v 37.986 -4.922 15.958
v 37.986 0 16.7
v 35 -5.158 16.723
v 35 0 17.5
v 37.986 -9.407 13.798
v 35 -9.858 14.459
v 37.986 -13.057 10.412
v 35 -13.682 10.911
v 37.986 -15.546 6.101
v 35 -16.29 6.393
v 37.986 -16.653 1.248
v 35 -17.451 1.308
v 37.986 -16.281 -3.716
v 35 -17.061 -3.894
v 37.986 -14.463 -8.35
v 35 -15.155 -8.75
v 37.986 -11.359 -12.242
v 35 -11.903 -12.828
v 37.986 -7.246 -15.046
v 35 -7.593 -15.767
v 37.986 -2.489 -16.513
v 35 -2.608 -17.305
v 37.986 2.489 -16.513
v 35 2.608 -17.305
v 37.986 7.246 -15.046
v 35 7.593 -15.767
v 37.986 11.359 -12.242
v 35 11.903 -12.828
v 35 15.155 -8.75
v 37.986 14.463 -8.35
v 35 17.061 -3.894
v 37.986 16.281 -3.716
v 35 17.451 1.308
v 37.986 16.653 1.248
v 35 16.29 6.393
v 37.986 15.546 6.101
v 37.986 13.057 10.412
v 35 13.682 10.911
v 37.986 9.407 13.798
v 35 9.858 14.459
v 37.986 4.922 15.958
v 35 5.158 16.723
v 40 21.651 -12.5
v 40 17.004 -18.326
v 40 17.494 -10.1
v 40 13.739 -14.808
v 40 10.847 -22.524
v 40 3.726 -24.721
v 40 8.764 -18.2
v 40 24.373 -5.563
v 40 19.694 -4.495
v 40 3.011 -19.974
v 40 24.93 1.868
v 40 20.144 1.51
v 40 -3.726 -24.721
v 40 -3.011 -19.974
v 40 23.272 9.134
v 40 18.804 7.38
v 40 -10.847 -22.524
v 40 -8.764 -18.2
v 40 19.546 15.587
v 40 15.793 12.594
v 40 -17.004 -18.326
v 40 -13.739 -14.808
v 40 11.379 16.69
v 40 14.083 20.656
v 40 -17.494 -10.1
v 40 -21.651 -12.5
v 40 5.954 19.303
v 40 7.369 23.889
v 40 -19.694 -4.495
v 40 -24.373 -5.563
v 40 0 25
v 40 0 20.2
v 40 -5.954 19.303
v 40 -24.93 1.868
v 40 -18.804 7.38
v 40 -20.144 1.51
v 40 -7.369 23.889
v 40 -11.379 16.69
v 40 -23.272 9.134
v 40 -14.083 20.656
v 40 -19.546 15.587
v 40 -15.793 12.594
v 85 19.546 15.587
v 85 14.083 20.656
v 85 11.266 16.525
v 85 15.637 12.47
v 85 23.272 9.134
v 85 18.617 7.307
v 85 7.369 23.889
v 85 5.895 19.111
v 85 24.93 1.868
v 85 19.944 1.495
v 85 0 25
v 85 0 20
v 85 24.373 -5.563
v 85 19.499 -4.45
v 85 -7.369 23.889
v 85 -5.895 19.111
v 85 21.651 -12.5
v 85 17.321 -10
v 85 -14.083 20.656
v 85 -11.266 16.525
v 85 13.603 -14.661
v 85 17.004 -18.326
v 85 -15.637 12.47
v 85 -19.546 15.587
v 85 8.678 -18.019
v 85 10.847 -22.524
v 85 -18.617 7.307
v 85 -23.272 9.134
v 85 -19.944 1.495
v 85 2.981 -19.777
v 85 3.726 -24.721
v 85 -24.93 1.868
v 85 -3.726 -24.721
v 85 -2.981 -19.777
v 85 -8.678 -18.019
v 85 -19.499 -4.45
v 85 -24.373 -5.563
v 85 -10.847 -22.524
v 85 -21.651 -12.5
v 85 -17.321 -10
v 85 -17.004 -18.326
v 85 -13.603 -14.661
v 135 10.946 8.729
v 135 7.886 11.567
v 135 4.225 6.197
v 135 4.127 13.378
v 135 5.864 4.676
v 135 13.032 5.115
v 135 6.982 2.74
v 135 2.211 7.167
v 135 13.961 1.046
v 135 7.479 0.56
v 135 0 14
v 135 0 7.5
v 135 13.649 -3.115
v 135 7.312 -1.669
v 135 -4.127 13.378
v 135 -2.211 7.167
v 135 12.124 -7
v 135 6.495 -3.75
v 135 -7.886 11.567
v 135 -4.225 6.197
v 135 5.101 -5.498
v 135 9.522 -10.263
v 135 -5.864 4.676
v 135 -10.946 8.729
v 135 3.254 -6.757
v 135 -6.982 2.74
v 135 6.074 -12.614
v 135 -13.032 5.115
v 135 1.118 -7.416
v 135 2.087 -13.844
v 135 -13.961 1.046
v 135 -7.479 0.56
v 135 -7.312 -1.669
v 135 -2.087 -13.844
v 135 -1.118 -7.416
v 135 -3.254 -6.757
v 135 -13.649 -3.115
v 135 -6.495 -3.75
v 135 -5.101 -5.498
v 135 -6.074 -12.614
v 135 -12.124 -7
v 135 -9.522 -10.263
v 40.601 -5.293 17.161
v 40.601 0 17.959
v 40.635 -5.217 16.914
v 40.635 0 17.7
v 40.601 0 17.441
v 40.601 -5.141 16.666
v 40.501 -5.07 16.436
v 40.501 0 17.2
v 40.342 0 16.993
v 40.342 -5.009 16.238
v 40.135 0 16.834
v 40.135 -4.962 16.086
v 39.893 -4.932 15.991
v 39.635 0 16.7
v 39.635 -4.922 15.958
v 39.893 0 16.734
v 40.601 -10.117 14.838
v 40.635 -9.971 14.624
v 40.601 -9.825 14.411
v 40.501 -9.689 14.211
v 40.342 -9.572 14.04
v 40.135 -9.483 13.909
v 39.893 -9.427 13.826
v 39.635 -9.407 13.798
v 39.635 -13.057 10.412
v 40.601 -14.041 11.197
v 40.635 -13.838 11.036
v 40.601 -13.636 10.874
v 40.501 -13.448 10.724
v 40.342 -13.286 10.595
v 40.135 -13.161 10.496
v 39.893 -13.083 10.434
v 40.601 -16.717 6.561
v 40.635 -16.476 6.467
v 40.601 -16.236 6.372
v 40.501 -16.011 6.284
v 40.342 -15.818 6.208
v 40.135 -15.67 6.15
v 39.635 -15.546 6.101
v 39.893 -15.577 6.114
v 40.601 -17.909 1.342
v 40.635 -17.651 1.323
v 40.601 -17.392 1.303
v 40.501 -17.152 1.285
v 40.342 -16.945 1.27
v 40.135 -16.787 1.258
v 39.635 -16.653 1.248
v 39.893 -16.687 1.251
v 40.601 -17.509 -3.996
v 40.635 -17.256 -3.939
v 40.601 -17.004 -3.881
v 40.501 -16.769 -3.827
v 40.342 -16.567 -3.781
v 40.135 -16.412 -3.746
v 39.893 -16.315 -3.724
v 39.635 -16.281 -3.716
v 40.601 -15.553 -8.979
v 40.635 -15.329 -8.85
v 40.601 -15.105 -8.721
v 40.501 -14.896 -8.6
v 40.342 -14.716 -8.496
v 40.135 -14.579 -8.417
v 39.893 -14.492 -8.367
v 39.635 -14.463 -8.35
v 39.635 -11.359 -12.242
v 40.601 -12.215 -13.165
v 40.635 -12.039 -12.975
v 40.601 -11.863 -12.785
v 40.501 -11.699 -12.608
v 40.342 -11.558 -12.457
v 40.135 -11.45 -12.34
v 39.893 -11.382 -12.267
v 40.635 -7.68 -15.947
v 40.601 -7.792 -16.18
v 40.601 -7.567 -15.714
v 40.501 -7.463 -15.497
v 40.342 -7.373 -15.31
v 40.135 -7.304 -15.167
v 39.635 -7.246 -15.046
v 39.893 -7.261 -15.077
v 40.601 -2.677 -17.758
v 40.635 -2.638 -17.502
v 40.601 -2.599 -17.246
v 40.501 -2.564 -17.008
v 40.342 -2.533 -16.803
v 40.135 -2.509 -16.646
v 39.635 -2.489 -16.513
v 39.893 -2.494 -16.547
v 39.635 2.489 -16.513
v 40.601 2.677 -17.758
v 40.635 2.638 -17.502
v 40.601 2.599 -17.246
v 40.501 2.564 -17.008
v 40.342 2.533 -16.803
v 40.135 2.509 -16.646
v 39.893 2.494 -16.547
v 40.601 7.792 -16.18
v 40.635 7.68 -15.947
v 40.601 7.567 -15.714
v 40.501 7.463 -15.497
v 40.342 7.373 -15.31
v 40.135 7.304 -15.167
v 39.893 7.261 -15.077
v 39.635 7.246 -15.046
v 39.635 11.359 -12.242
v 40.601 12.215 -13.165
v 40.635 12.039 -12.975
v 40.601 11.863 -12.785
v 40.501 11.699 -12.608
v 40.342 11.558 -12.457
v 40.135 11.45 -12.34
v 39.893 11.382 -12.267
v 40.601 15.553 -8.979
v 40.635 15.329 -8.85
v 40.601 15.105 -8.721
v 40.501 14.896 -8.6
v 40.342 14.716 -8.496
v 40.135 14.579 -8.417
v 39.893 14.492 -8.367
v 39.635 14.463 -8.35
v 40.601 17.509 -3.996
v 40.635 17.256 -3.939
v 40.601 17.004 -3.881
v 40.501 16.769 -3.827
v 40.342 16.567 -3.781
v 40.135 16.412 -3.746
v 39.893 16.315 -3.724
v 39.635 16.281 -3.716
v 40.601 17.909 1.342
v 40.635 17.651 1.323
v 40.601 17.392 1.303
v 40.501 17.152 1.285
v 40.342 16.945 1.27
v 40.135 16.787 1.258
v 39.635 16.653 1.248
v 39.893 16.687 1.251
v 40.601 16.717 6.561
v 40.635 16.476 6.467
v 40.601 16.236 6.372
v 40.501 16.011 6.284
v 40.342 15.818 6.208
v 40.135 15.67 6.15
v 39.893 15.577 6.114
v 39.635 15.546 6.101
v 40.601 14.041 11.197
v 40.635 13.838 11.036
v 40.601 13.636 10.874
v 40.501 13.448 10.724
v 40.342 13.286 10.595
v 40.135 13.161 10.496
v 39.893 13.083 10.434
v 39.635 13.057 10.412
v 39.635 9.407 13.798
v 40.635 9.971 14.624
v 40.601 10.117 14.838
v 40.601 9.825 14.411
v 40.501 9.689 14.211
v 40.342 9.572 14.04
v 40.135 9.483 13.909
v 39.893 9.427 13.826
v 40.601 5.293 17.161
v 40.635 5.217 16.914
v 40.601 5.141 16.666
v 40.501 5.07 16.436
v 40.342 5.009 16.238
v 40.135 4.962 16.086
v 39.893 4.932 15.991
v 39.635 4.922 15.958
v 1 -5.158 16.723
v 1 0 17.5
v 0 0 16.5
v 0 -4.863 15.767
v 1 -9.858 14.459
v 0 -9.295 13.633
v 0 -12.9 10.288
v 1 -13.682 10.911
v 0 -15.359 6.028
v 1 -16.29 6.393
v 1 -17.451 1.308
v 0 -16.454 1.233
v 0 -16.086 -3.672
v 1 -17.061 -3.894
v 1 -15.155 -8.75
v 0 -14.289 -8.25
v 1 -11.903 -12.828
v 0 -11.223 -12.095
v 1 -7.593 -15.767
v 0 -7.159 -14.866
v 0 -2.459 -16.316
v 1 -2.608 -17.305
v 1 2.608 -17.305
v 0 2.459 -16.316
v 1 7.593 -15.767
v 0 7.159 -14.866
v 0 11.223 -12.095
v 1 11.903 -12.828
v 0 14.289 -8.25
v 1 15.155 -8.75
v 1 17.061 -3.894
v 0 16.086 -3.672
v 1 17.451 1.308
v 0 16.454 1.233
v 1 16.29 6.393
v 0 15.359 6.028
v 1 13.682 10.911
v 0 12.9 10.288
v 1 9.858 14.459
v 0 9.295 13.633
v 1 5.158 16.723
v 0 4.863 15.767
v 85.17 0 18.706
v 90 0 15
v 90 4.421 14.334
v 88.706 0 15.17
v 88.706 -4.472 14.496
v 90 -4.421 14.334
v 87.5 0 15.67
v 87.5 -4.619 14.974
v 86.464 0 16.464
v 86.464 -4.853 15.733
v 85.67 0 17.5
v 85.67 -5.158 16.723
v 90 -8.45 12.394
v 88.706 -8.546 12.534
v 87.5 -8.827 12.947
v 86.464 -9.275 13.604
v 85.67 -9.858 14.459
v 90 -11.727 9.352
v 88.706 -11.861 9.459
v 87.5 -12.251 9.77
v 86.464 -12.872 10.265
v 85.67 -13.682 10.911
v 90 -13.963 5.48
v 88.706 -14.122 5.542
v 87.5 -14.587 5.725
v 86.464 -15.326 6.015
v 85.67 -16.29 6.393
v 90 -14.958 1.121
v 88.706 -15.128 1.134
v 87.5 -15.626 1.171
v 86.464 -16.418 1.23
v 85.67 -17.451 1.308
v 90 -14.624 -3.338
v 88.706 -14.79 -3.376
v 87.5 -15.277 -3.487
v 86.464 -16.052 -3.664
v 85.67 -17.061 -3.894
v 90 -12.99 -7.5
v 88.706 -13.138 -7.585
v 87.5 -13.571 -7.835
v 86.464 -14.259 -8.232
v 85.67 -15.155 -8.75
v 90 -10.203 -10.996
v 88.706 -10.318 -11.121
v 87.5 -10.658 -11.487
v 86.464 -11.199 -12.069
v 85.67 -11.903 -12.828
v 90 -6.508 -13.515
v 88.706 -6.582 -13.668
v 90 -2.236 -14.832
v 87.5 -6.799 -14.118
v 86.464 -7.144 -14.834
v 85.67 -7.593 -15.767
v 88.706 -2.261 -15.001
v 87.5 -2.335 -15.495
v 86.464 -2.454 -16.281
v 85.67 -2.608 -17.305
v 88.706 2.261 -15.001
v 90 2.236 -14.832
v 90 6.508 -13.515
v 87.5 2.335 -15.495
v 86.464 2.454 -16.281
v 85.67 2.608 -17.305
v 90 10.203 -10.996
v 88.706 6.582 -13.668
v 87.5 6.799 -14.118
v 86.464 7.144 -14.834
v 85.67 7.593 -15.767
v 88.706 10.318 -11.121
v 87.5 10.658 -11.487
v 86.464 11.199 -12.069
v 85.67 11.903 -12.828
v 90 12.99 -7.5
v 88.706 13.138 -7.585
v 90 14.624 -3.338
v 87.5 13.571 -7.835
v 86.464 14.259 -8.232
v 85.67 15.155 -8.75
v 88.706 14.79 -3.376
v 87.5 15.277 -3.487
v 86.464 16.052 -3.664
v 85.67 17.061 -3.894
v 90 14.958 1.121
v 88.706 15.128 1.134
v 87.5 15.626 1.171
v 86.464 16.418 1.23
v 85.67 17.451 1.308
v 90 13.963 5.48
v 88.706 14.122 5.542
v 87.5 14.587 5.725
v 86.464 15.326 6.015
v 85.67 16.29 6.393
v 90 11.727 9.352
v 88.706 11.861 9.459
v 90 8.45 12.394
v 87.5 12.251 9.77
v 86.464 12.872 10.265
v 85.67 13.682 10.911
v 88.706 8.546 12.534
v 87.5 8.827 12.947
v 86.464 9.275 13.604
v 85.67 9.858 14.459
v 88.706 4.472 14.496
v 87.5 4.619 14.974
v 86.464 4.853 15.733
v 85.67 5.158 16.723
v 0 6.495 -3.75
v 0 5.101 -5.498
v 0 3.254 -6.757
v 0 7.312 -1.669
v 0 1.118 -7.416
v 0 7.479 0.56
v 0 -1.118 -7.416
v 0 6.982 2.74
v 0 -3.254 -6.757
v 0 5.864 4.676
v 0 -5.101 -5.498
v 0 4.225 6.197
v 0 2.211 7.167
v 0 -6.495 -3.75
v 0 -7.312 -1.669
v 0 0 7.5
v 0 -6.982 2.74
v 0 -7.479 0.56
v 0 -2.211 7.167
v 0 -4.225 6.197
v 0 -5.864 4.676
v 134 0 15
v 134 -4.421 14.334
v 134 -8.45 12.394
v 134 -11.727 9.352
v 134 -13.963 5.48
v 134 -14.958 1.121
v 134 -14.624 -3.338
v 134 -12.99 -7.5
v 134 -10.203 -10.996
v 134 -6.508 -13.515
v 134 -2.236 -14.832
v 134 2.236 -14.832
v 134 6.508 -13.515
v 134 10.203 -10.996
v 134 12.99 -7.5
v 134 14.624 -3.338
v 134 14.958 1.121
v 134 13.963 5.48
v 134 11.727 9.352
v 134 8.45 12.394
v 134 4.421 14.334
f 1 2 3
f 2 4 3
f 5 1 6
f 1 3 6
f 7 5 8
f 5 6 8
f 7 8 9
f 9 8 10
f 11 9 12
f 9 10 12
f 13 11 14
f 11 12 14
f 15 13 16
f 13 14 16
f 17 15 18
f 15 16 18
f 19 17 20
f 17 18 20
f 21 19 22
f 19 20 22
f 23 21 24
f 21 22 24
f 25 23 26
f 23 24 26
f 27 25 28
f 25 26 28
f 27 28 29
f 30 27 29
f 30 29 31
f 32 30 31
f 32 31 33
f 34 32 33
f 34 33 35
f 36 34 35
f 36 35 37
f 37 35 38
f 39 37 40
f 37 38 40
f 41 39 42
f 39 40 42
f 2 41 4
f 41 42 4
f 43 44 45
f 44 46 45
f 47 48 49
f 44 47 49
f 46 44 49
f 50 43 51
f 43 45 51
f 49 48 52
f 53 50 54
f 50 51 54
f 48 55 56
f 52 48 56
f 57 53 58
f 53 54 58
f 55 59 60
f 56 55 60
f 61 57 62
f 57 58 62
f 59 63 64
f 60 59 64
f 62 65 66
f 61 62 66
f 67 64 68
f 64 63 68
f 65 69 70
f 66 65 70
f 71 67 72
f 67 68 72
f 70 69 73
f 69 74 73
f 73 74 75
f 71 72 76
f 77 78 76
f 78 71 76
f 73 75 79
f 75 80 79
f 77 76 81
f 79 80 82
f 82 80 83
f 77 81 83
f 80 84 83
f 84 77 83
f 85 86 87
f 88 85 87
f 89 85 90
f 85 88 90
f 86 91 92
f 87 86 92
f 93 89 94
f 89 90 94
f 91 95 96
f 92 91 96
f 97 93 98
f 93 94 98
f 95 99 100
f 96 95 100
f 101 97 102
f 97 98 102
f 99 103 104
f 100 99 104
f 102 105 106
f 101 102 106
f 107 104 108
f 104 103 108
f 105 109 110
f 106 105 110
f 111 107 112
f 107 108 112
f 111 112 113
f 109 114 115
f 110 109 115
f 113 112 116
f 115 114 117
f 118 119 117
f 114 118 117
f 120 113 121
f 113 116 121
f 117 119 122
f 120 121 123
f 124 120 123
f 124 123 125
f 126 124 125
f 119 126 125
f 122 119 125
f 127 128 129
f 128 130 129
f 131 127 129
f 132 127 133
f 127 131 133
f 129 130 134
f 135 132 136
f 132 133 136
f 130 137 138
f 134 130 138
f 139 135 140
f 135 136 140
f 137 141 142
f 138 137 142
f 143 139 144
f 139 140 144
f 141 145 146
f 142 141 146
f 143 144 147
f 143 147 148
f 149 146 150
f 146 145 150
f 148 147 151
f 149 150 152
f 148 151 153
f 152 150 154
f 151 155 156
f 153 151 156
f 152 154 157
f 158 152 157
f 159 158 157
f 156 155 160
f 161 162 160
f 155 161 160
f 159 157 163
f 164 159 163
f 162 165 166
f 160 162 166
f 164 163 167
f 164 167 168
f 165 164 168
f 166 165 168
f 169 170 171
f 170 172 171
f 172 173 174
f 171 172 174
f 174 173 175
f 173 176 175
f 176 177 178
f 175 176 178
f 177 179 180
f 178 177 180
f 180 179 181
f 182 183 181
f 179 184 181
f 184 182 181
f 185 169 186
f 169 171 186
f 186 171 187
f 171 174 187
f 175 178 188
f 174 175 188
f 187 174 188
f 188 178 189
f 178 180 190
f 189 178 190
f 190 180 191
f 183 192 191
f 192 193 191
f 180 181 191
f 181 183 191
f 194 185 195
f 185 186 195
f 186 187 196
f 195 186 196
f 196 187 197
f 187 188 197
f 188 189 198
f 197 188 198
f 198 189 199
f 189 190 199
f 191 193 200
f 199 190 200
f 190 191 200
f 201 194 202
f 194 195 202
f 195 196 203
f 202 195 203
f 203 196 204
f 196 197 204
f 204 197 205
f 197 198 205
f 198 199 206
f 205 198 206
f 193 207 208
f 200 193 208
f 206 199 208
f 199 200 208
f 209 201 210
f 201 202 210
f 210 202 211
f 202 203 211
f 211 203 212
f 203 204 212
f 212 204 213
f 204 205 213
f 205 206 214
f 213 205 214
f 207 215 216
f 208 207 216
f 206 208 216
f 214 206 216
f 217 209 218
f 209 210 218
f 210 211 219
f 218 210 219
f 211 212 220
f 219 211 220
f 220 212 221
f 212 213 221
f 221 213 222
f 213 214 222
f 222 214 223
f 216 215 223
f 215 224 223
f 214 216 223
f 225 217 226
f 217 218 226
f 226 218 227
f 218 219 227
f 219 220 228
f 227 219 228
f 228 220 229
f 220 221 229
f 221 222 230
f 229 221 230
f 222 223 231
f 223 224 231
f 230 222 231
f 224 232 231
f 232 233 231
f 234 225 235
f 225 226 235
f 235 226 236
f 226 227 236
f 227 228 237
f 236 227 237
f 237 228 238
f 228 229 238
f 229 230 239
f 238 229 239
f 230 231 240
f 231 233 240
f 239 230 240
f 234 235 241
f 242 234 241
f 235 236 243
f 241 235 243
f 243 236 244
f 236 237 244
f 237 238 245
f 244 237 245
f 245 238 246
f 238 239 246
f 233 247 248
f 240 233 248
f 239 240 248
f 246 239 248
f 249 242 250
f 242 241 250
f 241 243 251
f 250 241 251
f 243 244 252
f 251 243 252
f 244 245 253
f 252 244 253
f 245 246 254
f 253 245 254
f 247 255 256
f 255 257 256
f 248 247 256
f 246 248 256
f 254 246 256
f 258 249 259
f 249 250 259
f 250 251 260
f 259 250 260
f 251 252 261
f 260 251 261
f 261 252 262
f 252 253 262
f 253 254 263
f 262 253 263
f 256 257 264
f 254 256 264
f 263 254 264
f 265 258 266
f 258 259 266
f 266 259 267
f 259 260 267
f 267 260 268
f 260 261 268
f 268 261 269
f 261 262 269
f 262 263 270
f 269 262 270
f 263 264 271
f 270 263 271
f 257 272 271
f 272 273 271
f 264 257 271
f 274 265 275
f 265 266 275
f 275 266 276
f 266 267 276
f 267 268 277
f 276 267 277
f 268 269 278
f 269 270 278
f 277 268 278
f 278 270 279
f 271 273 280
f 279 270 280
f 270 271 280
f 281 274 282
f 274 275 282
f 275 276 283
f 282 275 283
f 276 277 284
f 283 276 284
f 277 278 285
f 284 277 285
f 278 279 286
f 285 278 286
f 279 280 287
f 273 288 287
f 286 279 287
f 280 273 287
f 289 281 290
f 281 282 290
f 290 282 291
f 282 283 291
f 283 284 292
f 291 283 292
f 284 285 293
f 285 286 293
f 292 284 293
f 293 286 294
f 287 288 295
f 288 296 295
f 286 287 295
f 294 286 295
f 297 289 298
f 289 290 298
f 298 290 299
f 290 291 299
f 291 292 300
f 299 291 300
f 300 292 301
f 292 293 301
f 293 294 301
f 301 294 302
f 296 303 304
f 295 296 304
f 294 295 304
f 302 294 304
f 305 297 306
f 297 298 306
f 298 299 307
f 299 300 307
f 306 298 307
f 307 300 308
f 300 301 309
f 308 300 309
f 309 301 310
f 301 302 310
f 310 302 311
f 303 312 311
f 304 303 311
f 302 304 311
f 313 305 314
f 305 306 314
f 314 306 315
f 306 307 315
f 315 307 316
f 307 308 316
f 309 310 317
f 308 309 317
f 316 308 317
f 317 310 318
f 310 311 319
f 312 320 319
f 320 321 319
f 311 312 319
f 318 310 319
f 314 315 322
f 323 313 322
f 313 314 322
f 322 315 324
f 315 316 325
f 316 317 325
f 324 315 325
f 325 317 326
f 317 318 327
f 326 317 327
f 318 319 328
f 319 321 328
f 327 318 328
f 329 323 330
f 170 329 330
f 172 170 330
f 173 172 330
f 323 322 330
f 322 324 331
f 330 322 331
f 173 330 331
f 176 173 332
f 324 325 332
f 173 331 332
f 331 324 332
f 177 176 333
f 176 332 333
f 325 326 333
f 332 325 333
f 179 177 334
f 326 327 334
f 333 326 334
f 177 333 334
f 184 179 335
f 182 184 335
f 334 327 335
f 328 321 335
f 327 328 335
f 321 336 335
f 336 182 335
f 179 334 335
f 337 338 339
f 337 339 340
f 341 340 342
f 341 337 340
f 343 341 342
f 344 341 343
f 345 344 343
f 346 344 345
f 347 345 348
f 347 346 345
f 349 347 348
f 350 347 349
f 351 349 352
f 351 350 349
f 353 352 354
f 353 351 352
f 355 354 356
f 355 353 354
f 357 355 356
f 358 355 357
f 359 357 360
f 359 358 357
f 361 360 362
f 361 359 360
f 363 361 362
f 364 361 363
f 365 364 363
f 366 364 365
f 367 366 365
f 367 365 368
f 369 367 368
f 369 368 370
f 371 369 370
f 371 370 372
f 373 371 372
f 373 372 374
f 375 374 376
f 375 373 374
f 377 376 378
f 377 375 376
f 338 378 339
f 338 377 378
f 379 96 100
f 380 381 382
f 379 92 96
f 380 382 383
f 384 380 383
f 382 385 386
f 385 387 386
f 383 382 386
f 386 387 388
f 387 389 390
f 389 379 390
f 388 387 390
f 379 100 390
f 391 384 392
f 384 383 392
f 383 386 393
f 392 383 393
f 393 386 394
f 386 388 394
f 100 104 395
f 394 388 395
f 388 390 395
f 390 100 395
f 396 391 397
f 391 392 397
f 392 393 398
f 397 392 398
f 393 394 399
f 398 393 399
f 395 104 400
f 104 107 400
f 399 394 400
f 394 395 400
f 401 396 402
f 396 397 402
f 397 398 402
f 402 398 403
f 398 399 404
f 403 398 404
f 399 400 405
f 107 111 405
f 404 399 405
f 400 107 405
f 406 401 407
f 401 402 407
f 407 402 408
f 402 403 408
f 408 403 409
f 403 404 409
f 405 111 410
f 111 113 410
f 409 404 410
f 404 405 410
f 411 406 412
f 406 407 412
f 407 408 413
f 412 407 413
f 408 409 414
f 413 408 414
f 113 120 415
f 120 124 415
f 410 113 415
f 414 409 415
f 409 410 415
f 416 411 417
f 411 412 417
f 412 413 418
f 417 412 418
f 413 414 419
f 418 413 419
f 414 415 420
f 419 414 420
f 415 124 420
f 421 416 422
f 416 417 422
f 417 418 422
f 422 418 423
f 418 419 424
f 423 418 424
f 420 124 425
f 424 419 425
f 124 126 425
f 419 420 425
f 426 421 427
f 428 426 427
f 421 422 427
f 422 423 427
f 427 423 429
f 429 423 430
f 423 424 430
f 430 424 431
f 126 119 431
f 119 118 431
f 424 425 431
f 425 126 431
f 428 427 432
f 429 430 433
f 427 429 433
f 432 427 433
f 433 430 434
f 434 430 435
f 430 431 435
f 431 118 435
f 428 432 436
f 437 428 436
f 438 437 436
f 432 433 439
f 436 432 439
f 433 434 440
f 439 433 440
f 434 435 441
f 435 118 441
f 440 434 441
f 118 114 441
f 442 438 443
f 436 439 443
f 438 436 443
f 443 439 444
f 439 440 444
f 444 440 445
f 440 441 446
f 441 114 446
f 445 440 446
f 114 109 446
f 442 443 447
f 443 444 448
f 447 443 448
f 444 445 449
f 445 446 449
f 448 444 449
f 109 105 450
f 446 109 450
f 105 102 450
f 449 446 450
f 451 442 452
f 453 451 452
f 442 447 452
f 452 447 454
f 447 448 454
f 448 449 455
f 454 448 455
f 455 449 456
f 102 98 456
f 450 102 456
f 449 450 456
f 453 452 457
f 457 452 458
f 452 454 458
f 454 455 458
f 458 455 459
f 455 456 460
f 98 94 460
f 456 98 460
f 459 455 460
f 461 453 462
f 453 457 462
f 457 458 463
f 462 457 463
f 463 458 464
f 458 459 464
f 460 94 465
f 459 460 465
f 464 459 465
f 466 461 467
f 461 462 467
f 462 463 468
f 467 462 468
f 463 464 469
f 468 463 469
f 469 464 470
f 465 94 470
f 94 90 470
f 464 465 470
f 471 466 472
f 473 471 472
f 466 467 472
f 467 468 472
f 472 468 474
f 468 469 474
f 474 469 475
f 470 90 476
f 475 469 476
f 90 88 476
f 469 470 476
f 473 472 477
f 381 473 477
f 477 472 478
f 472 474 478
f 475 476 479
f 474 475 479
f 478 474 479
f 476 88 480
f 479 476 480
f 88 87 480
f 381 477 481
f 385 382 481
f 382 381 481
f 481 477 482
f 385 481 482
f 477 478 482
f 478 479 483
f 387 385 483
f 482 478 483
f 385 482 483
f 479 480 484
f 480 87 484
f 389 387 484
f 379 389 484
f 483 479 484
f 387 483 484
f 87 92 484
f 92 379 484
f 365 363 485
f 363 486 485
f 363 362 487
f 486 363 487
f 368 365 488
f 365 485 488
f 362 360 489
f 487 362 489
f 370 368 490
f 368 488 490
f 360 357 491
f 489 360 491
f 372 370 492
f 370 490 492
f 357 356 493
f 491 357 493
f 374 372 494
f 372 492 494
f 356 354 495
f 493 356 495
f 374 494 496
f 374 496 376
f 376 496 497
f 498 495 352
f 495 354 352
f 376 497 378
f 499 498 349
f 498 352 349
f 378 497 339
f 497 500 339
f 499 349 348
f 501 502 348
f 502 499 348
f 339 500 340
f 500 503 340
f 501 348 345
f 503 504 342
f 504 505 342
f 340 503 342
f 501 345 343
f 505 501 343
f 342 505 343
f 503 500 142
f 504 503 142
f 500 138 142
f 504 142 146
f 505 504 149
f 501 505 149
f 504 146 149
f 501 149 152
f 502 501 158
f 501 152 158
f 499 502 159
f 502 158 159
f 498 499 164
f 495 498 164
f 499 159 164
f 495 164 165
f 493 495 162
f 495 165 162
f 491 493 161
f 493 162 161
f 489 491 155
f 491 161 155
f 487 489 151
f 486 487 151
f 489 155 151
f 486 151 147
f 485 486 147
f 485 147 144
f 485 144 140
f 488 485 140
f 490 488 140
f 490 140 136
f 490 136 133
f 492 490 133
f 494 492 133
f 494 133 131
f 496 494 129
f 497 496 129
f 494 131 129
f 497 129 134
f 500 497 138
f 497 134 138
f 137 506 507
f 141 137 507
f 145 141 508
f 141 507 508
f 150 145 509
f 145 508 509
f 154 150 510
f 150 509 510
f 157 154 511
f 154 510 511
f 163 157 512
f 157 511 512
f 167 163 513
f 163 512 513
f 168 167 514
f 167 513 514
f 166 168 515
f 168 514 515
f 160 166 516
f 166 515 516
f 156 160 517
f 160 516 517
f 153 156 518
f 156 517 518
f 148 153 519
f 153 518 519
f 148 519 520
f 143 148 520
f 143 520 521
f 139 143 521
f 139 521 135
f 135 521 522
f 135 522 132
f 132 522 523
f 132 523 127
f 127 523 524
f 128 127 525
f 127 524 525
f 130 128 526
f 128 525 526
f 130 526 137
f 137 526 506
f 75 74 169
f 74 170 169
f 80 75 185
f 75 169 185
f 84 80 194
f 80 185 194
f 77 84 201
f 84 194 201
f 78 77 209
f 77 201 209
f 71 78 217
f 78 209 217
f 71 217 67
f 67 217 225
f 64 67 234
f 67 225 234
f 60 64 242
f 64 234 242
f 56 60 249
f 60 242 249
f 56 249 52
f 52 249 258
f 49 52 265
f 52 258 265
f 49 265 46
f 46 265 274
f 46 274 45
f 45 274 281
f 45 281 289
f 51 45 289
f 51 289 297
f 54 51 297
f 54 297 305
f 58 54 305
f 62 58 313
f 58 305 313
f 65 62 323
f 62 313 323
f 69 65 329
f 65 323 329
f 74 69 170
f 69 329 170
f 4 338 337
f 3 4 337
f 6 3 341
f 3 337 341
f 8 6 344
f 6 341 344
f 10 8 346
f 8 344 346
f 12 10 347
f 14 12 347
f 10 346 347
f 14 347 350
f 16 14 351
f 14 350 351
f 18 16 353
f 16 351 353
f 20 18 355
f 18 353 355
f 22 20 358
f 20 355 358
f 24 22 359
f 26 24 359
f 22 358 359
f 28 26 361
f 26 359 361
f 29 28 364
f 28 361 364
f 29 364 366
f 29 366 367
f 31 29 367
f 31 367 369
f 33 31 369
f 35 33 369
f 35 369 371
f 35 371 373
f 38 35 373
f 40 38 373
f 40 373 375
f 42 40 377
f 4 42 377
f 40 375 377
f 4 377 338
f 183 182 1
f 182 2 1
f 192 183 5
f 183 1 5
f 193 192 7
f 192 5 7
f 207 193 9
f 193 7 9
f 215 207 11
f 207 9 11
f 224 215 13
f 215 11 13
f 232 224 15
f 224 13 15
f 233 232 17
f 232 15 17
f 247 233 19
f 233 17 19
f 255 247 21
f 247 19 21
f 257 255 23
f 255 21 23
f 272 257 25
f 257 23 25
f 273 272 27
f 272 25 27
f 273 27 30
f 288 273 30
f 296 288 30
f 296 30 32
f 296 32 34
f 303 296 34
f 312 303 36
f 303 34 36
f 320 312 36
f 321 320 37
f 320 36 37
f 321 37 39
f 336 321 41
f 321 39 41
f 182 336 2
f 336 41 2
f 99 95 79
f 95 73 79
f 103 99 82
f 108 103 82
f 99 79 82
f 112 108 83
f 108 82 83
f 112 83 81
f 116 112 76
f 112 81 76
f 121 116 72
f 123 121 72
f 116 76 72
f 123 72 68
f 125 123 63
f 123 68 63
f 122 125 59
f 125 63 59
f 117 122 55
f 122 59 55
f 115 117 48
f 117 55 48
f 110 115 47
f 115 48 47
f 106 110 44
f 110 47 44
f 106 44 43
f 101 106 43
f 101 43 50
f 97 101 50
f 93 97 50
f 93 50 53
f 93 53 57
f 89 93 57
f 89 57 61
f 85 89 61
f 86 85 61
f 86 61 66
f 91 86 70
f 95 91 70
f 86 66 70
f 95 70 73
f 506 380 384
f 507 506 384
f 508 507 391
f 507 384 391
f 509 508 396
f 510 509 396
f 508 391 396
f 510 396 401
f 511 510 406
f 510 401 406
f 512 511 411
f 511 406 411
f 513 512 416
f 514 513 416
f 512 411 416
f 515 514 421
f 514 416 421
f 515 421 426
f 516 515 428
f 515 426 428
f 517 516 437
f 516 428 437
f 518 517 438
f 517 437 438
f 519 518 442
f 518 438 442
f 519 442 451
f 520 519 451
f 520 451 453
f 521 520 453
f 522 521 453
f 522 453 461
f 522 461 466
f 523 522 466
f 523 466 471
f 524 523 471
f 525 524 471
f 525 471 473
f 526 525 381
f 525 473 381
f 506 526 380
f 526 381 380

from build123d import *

# Parameters (mm, degrees)
F2_SIZE = 1
F3_R    = 5


with BuildPart() as f1:
    # F0 (on Front) → F1 (revolve)
    with BuildSketch(Plane.XZ):
        with BuildLine():
            Line((0, 17.5), (0, 7.5))
            Line((0, 7.5), (135, 7.5))
            Line((135, 7.5), (135, 15))
            Line((135, 15), (85, 15))
            Line((85, 15), (85, 25))
            Line((85, 25), (40, 25))
            Line((40, 25), (40, 20.2))
            Line((40, 20.2), (40.600523, 17.958819))
            ThreePointArc((40.600523, 17.958819), (40.42795, 17.091239), (39.634597, 16.7))
            Line((39.634597, 16.7), (37.985641, 16.7))
            Line((37.985641, 16.7), (35, 17.5))
            Line((35, 17.5), (0, 17.5))
        make_face()
    revolve(axis=Axis((67.5, 0, 0), (1, 0, 0)))

    # F2
    f2_edges = [f1.edges().sort_by_distance(p)[0] for p in [
        (0, 0, -17.5),
        (135, 0, -15),
    ]]
    chamfer(f2_edges, length=F2_SIZE)

    # F3
    f3_edges = [f1.edges().sort_by_distance(p)[0] for p in [
        (85, 0, -15),
    ]]
    fillet(f3_edges, radius=F3_R)


solid = f1.part
